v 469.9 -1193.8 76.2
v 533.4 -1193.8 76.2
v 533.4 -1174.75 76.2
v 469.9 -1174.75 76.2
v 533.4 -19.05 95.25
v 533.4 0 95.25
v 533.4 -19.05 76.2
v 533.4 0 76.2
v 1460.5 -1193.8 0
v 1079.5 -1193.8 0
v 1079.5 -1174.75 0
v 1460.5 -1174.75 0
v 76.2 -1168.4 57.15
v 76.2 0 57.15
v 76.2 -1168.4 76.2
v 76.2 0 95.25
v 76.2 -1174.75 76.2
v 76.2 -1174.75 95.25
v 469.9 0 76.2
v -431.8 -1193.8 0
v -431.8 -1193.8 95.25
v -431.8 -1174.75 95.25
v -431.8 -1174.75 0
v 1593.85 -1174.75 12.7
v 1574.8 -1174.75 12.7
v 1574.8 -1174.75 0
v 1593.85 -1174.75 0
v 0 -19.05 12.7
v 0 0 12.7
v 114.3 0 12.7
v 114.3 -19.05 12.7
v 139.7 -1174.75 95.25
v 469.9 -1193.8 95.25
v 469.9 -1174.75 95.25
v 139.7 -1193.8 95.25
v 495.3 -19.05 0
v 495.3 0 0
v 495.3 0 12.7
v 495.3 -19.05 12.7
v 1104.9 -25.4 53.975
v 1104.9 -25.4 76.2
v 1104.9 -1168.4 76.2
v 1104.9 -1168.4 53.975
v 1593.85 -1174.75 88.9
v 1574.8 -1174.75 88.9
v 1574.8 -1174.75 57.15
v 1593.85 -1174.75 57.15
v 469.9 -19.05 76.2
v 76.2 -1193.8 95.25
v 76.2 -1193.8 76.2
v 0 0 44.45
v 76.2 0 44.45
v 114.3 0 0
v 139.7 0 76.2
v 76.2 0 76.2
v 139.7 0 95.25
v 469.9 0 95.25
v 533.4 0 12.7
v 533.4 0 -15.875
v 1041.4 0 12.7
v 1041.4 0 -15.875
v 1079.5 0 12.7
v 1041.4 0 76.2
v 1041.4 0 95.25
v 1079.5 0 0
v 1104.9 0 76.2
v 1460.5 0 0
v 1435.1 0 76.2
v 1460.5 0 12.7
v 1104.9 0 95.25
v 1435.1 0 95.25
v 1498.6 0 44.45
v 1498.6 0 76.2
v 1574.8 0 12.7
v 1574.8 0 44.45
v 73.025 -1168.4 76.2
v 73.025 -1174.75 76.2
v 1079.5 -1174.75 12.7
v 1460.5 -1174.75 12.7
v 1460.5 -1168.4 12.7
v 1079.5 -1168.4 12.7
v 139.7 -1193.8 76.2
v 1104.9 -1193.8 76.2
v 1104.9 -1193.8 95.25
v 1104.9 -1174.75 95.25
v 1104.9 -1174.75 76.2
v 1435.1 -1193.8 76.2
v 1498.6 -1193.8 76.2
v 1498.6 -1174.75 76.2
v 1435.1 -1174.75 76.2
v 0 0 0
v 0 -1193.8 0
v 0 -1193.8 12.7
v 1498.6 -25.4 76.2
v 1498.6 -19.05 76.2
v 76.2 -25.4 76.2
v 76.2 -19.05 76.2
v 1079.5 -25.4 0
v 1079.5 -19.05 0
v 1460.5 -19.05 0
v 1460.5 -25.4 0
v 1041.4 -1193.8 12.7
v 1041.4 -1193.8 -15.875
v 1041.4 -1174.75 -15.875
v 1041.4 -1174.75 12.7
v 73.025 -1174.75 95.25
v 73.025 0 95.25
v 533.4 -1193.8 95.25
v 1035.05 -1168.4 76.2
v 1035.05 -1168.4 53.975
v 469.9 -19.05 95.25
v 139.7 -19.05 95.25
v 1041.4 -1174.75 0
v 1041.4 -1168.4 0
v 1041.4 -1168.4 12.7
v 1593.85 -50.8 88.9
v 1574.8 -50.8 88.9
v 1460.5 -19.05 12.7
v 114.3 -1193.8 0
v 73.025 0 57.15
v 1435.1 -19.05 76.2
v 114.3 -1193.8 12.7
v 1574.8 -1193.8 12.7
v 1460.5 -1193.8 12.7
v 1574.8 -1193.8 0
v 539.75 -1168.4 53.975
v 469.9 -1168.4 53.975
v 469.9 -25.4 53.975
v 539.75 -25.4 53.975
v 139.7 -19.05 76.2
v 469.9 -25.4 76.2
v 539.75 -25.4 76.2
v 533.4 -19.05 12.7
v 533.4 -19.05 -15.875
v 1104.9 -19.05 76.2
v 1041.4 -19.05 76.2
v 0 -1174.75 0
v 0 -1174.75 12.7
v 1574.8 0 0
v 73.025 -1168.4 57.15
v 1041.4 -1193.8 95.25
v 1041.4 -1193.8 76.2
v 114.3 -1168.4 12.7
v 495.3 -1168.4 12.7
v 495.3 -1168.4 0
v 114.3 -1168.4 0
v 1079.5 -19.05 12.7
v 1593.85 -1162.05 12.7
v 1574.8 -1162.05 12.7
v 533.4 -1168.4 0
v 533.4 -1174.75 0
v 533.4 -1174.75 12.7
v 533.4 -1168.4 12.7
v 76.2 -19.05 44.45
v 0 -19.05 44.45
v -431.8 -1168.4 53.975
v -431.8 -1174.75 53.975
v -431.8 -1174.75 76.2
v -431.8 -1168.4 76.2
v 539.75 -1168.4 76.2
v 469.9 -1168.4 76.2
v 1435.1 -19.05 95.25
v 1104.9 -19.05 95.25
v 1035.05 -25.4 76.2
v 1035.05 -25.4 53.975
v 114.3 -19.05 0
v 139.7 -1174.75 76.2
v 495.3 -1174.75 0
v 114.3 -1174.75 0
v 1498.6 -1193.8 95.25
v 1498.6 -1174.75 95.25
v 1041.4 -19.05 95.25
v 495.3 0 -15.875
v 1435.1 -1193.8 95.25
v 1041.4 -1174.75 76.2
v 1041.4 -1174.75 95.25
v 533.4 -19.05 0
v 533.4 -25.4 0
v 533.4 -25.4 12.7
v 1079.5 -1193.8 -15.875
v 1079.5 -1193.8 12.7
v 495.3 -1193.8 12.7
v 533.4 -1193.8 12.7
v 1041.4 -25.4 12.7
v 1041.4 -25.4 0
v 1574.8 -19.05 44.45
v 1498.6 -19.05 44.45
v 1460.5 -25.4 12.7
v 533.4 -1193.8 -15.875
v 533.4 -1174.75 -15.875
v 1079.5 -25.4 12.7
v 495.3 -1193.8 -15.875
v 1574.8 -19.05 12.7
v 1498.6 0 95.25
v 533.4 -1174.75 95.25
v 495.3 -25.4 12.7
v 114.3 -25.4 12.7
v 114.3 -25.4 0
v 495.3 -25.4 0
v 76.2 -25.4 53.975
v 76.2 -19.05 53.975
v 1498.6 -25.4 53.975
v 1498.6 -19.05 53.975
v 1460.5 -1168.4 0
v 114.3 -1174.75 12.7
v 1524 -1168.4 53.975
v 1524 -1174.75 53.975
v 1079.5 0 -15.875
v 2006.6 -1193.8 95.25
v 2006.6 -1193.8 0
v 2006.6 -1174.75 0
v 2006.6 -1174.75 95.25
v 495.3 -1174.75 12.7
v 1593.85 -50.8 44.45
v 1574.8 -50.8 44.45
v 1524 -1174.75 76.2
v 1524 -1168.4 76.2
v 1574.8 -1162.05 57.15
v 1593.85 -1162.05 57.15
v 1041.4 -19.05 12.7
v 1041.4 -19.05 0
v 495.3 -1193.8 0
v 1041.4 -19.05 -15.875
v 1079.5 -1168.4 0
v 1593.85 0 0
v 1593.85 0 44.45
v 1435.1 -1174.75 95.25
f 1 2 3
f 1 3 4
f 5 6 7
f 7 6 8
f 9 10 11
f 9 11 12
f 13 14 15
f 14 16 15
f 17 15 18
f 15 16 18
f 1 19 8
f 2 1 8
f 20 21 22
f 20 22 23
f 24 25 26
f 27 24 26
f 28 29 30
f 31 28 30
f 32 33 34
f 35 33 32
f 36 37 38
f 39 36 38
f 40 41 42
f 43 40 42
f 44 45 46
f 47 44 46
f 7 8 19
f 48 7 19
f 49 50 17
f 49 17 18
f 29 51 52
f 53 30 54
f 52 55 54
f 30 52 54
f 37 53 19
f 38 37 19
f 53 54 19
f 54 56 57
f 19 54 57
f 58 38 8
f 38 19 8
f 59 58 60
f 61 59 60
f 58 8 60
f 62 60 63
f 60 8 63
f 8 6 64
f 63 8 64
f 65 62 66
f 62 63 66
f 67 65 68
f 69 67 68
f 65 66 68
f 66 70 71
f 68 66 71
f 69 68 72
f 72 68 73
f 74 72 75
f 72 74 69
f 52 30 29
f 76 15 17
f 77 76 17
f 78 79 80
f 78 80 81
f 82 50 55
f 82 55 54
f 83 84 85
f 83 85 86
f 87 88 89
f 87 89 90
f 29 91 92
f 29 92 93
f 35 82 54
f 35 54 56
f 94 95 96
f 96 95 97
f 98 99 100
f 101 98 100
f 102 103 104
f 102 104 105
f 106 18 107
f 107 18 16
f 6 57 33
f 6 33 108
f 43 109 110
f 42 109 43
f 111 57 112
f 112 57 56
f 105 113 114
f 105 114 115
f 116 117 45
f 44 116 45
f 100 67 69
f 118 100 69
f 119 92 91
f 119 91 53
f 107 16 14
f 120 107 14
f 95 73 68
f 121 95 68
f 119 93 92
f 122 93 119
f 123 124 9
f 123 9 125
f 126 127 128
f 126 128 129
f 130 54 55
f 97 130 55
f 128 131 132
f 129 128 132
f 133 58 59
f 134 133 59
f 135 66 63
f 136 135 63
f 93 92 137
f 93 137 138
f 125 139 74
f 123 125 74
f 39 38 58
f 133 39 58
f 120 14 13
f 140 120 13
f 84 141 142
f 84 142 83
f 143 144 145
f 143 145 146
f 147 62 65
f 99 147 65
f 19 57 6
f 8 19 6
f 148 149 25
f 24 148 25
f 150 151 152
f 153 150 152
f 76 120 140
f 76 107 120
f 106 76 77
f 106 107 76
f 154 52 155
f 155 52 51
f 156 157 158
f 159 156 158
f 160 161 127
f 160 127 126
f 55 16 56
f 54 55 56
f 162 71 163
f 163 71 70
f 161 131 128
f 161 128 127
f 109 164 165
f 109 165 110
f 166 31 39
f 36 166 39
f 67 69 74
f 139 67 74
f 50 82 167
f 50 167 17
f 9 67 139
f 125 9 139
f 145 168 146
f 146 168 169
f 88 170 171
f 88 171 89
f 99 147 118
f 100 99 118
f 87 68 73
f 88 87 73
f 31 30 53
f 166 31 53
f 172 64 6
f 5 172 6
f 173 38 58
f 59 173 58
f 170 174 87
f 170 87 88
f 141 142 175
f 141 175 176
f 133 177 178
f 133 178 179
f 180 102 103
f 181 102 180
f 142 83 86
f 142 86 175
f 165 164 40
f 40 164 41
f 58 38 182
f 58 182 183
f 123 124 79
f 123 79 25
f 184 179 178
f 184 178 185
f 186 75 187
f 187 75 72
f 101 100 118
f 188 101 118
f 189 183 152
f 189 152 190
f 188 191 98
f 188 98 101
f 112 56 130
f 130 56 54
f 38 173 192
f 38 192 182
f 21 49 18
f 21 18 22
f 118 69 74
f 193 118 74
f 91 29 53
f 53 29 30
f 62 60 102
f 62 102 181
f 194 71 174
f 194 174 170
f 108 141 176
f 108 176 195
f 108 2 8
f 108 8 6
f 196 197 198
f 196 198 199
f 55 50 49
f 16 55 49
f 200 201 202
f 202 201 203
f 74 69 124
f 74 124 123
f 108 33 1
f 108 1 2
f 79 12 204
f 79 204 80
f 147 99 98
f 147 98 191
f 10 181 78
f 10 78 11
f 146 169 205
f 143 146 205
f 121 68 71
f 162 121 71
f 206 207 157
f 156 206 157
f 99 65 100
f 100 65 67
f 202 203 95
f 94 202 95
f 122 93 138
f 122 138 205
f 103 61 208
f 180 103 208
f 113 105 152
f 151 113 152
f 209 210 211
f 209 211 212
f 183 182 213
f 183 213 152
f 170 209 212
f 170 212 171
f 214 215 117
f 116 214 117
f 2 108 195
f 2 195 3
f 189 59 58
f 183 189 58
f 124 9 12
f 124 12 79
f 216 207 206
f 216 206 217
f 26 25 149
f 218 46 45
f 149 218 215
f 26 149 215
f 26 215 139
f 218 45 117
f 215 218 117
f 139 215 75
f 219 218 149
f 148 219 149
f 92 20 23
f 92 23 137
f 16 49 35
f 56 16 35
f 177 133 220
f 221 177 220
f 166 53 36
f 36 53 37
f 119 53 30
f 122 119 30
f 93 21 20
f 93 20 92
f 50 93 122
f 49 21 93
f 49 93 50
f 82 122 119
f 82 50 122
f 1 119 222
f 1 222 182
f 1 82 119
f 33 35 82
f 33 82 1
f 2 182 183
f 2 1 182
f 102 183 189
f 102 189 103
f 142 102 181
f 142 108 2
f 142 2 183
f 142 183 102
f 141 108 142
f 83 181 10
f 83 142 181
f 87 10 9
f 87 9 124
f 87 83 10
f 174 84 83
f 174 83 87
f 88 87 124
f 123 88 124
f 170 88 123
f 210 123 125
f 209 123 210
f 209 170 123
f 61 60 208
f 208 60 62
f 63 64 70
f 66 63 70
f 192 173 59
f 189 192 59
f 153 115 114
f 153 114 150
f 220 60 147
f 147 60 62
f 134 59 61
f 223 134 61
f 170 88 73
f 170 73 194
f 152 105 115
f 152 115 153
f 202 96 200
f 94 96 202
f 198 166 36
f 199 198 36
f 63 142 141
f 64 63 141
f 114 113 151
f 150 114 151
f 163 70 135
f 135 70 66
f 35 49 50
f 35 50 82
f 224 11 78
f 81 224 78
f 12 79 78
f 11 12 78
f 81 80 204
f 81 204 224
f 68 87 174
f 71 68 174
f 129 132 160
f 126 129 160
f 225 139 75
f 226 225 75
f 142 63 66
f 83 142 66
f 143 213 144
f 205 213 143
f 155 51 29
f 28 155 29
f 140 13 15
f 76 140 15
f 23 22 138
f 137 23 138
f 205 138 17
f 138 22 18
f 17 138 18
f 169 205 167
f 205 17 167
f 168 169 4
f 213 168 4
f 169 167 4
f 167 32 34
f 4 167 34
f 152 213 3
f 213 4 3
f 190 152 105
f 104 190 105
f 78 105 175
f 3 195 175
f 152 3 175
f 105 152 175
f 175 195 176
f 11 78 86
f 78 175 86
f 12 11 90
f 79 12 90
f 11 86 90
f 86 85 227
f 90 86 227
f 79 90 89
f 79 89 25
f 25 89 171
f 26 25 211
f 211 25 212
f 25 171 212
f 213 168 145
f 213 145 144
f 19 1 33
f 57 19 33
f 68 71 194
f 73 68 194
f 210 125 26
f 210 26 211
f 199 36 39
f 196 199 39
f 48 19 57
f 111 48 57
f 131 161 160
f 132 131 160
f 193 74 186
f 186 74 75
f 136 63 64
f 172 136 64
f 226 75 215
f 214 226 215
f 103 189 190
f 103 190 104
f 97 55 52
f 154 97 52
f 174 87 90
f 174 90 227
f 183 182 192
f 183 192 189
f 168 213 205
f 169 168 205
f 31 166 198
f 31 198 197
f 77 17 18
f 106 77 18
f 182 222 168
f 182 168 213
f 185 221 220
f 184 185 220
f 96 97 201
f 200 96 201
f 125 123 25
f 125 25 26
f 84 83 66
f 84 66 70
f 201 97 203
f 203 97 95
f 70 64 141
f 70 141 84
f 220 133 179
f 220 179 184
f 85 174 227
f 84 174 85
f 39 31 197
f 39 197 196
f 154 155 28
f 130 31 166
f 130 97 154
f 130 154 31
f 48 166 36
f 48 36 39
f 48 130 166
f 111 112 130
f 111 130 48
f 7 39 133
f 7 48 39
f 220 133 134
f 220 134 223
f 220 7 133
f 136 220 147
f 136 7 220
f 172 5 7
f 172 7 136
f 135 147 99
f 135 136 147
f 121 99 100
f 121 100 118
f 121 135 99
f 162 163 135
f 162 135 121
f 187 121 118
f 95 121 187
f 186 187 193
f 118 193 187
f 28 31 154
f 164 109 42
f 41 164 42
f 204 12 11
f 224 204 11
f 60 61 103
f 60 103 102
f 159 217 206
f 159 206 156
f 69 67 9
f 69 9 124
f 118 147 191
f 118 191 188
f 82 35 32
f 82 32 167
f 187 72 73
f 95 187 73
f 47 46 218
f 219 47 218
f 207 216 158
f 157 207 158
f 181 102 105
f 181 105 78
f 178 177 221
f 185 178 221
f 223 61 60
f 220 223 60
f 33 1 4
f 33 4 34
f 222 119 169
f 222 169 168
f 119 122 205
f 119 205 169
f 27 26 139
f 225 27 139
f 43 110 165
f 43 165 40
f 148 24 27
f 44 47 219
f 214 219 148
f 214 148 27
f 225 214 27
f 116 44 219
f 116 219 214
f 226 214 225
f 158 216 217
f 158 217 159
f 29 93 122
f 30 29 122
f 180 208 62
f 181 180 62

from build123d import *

# Parameters (mm, degrees)
F0_W      = 254
F0_H      = 15.875
F1_DEPTH  = 19.05
F2_W      = 381
F2_H      = 12.7
F3_DEPTH  = 6.35
F2_W_2    = 508
F5_DEPTH  = 6.35
F6_W      = 63.5
F6_H      = 19.05
F7_DEPTH  = 1193.8
F6_W_2    = 114.3
F6_H_2    = 12.7
F6_W_3    = 38.1
F6_H_3    = 28.575
F9_DEPTH  = 19.05
F10_W     = 1955.8
F10_H     = 22.225
F11_DEPTH = 6.35
F12_W     = 381
F12_H     = 12.7
F13_DEPTH = 6.35
F12_W_2   = 508
F14_W     = 69.85
F14_H     = 1143
F15_DEPTH = 22.225
F16_W     = 69.85
F16_H     = 1143
F17_DEPTH = 22.225
F18_W     = 1168.4
F18_H     = 19.05
F19_DEPTH = 3.175
F21_DEPTH = 19.05


# Not quite as in the source:
# - a feature names something its author has since deleted; it is built from what else it names


with BuildPart() as f1:
    # F0 (on Front) → F1 (new body)
    with BuildSketch(Plane.XZ):
        Polygon((114.3, 12.7), (114.3, 0), (495.3, 0), (495.3, 12.7), (533.4, 12.7), (533.4, 0), (787.4, 0), (787.4, 95.25), (533.4, 95.25), (533.4, 76.2), (469.9, 76.2), (469.9, 95.25), (139.7, 95.25), (139.7, 76.2), (76.2, 76.2), (76.2, 44.45), (0, 44.45), (0, 12.7), align=None)
        Polygon((787.4, 95.25), (787.4, 0), (1041.4, 0), (1041.4, 12.7), (1079.5, 12.7), (1079.5, 0), (1460.5, 0), (1460.5, 12.7), (1574.8, 12.7), (1574.8, 44.45), (1498.6, 44.45), (1498.6, 76.2), (1435.1, 76.2), (1435.1, 95.25), (1104.9, 95.25), (1104.9, 76.2), (1041.4, 76.2), (1041.4, 95.25), align=None)
        with Locations((660.4, -7.9375)):
            Rectangle(F0_W, F0_H)
        with Locations((914.4, -7.9375)):
            Rectangle(F0_W, F0_H)
    extrude(amount=F1_DEPTH)


with BuildPart() as f3:
    # F2 (on face) → F3 (new body)
    with BuildSketch(Plane.XZ.offset(19.05)):
        with Locations((304.8, 6.35)):
            Rectangle(F2_W, F2_H)
    extrude(amount=F3_DEPTH)


with BuildPart() as f3b:
    # F2 (on face) → F3, piece 2 (new body)
    with BuildSketch(Plane.XZ.offset(19.05)):
        with Locations((1270, 6.35)):
            Rectangle(F2_W, F2_H)
    extrude(amount=F3_DEPTH)


with BuildPart() as f3c:
    # F2 (on face) → F3, piece 3 (new body)
    with BuildSketch(Plane.XZ.offset(19.05)):
        with Locations((787.4, 6.35)):
            Rectangle(F2_W_2, F2_H)
    extrude(amount=F3_DEPTH)


with BuildPart() as f5:
    # F4 (on face) → F5 (new body)
    with BuildSketch(Plane.XZ.offset(19.05)):
        Polygon((76.2, 76.2), (76.2, 53.975), (1498.6, 53.975), (1498.6, 76.2), (1435.1, 76.2), (1104.9, 76.2), (1041.4, 76.2), (533.4, 76.2), (469.9, 76.2), (139.7, 76.2), align=None)
    extrude(amount=F5_DEPTH)


with BuildPart() as f7:
    # F6 (on Front) → F7 (new body)
    with BuildSketch(Plane.XZ):
        with Locations((107.95, 85.725)):
            Rectangle(F6_W, F6_H)
    extrude(amount=F7_DEPTH)


with BuildPart() as f7b:
    # F6 (on Front) → F7, piece 2 (new body)
    with BuildSketch(Plane.XZ):
        with Locations((501.65, 85.725)):
            Rectangle(F6_W, F6_H)
    extrude(amount=F7_DEPTH)


with BuildPart() as f7c:
    # F6 (on Front) → F7, piece 3 (new body)
    with BuildSketch(Plane.XZ):
        with Locations((1466.85, 85.725)):
            Rectangle(F6_W, F6_H)
    extrude(amount=F7_DEPTH)


with BuildPart() as f7d:
    # F6 (on Front) → F7, piece 4 (new body)
    with BuildSketch(Plane.XZ):
        with Locations((1073.15, 85.725)):
            Rectangle(F6_W, F6_H)
    extrude(amount=F7_DEPTH)


with BuildPart() as f7e:
    # F6 (on Front) → F7, piece 5 (new body)
    with BuildSketch(Plane.XZ):
        with Locations((1517.65, 6.35)):
            Rectangle(F6_W_2, F6_H_2)
    extrude(amount=F7_DEPTH)


with BuildPart() as f7f:
    # F6 (on Front) → F7, piece 6 (new body)
    with BuildSketch(Plane.XZ):
        with Locations((57.15, 6.35)):
            Rectangle(F6_W_2, F6_H_2)
    extrude(amount=F7_DEPTH)


with BuildPart() as f7g:
    # F6 (on Front) → F7, piece 7 (new body)
    with BuildSketch(Plane.XZ):
        with Locations((514.35, -1.5875)):
            Rectangle(F6_W_3, F6_H_3)
    extrude(amount=F7_DEPTH)


with BuildPart() as f7h:
    # F6 (on Front) → F7, piece 8 (new body)
    with BuildSketch(Plane.XZ):
        with Locations((1060.45, -1.5875)):
            Rectangle(F6_W_3, F6_H_3)
    extrude(amount=F7_DEPTH)


with BuildPart() as f9:
    # F8 (on face) → F9 (new body)
    with BuildSketch(Plane.XZ.offset(1193.8)):
        Polygon((469.9, 95.25), (292.1, 95.25), (139.7, 95.25), (139.7, 76.2), (76.2, 76.2), (76.2, 95.25), (-431.8, 95.25), (-431.8, 0), (0, 0), (0, 12.7), (114.3, 12.7), (114.3, 0), (317.5, 0), (495.3, 0), (495.3, 12.7), (533.4, 12.7), (533.4, 0), (787.4, 0), (787.4, 95.25), (533.4, 95.25), (533.4, 76.2), (469.9, 76.2), align=None)
        Polygon((1041.4, 95.25), (787.4, 95.25), (787.4, 0), (1041.4, 0), (1041.4, 12.7), (1079.5, 12.7), (1079.5, 0), (1257.3, 0), (1460.5, 0), (1460.5, 12.7), (1574.8, 12.7), (1574.8, 0), (2006.6, 0), (2006.6, 95.25), (1498.6, 95.25), (1498.6, 76.2), (1435.1, 76.2), (1435.1, 95.25), (1282.7, 95.25), (1104.9, 95.25), (1104.9, 76.2), (1041.4, 76.2), align=None)
        Polygon((1041.4, 0), (787.4, 0), (533.4, 0), (533.4, -15.875), (1041.4, -15.875), align=None)
    extrude(amount=-F9_DEPTH)


with BuildPart() as f11:
    # F10 (on face) → F11 (new body)
    with BuildSketch(Plane(origin=(0, -1174.75, 0), x_dir=(-1, 0, 0), z_dir=(0, 1, 0))):
        with Locations((-546.1, 65.0875)):
            Rectangle(F10_W, F10_H)
    extrude(amount=F11_DEPTH)


with BuildPart() as f13:
    # F12 (on face) → F13 (new body)
    with BuildSketch(Plane(origin=(0, -1174.75, 0), x_dir=(-1, 0, 0), z_dir=(0, 1, 0))):
        with Locations((-1270, 6.35)):
            Rectangle(F12_W, F12_H)
    extrude(amount=F13_DEPTH)


with BuildPart() as f13b:
    # F12 (on face) → F13, piece 2 (new body)
    with BuildSketch(Plane(origin=(0, -1174.75, 0), x_dir=(-1, 0, 0), z_dir=(0, 1, 0))):
        with Locations((-304.8, 6.35)):
            Rectangle(F12_W, F12_H)
    extrude(amount=F13_DEPTH)


with BuildPart() as f13c:
    # F12 (on face) → F13, piece 3 (new body)
    with BuildSketch(Plane(origin=(0, -1174.75, 0), x_dir=(-1, 0, 0), z_dir=(0, 1, 0))):
        with Locations((-787.4, 6.35)):
            Rectangle(F12_W_2, F12_H)
    extrude(amount=F13_DEPTH)


with BuildPart() as f15:
    # F14 (on face) → F15 (new body)
    with BuildSketch(Plane(origin=(0, 0, 76.2), x_dir=(1, 0, 0), z_dir=(0, 0, -1))):
        with Locations((1069.975, 596.9)):
            Rectangle(F14_W, F14_H)
    extrude(amount=F15_DEPTH)


with BuildPart() as f17:
    # F16 (on face) → F17 (new body)
    with BuildSketch(Plane(origin=(0, 0, 76.2), x_dir=(1, 0, 0), z_dir=(0, 0, -1))):
        with Locations((504.825, 596.9)):
            Rectangle(F16_W, F16_H)
    extrude(amount=F17_DEPTH)


with BuildPart() as f19:
    # F18 (on face) → F19 (new body)
    with BuildSketch(Plane(origin=(76.2, 0, 0), x_dir=(0, -1, 0), z_dir=(-1, 0, 0))):
        with Locations((584.2, 66.675)):
            Rectangle(F18_W, F18_H)
        Polygon((1174.75, 76.2), (1174.75, 95.25), (0, 95.25), (0, 76.2), (1168.4, 76.2), align=None)
    extrude(amount=F19_DEPTH)


with BuildPart() as f21:
    # F20 (on face) → F21 (new body)
    with BuildSketch(Plane.YZ.offset(1574.8)):
        Polygon((-1162.05, 12.7), (-1174.75, 12.7), (-1174.75, 0), (0, 0), (0, 12.7), align=None)
        Polygon((-50.8, 88.9), (-1174.75, 88.9), (-1174.75, 57.15), (-1162.05, 57.15), (-1162.05, 12.7), (0, 12.7), (0, 44.45), (-50.8, 44.45), align=None)
    extrude(amount=F21_DEPTH)


solid = Compound([f1.part, f3.part, f3b.part, f3c.part, f5.part, f7.part, f7b.part, f7c.part, f7d.part, f7e.part, f7f.part, f7g.part, f7h.part, f9.part, f11.part, f13.part, f13b.part, f13c.part, f15.part, f17.part, f19.part, f21.part])
